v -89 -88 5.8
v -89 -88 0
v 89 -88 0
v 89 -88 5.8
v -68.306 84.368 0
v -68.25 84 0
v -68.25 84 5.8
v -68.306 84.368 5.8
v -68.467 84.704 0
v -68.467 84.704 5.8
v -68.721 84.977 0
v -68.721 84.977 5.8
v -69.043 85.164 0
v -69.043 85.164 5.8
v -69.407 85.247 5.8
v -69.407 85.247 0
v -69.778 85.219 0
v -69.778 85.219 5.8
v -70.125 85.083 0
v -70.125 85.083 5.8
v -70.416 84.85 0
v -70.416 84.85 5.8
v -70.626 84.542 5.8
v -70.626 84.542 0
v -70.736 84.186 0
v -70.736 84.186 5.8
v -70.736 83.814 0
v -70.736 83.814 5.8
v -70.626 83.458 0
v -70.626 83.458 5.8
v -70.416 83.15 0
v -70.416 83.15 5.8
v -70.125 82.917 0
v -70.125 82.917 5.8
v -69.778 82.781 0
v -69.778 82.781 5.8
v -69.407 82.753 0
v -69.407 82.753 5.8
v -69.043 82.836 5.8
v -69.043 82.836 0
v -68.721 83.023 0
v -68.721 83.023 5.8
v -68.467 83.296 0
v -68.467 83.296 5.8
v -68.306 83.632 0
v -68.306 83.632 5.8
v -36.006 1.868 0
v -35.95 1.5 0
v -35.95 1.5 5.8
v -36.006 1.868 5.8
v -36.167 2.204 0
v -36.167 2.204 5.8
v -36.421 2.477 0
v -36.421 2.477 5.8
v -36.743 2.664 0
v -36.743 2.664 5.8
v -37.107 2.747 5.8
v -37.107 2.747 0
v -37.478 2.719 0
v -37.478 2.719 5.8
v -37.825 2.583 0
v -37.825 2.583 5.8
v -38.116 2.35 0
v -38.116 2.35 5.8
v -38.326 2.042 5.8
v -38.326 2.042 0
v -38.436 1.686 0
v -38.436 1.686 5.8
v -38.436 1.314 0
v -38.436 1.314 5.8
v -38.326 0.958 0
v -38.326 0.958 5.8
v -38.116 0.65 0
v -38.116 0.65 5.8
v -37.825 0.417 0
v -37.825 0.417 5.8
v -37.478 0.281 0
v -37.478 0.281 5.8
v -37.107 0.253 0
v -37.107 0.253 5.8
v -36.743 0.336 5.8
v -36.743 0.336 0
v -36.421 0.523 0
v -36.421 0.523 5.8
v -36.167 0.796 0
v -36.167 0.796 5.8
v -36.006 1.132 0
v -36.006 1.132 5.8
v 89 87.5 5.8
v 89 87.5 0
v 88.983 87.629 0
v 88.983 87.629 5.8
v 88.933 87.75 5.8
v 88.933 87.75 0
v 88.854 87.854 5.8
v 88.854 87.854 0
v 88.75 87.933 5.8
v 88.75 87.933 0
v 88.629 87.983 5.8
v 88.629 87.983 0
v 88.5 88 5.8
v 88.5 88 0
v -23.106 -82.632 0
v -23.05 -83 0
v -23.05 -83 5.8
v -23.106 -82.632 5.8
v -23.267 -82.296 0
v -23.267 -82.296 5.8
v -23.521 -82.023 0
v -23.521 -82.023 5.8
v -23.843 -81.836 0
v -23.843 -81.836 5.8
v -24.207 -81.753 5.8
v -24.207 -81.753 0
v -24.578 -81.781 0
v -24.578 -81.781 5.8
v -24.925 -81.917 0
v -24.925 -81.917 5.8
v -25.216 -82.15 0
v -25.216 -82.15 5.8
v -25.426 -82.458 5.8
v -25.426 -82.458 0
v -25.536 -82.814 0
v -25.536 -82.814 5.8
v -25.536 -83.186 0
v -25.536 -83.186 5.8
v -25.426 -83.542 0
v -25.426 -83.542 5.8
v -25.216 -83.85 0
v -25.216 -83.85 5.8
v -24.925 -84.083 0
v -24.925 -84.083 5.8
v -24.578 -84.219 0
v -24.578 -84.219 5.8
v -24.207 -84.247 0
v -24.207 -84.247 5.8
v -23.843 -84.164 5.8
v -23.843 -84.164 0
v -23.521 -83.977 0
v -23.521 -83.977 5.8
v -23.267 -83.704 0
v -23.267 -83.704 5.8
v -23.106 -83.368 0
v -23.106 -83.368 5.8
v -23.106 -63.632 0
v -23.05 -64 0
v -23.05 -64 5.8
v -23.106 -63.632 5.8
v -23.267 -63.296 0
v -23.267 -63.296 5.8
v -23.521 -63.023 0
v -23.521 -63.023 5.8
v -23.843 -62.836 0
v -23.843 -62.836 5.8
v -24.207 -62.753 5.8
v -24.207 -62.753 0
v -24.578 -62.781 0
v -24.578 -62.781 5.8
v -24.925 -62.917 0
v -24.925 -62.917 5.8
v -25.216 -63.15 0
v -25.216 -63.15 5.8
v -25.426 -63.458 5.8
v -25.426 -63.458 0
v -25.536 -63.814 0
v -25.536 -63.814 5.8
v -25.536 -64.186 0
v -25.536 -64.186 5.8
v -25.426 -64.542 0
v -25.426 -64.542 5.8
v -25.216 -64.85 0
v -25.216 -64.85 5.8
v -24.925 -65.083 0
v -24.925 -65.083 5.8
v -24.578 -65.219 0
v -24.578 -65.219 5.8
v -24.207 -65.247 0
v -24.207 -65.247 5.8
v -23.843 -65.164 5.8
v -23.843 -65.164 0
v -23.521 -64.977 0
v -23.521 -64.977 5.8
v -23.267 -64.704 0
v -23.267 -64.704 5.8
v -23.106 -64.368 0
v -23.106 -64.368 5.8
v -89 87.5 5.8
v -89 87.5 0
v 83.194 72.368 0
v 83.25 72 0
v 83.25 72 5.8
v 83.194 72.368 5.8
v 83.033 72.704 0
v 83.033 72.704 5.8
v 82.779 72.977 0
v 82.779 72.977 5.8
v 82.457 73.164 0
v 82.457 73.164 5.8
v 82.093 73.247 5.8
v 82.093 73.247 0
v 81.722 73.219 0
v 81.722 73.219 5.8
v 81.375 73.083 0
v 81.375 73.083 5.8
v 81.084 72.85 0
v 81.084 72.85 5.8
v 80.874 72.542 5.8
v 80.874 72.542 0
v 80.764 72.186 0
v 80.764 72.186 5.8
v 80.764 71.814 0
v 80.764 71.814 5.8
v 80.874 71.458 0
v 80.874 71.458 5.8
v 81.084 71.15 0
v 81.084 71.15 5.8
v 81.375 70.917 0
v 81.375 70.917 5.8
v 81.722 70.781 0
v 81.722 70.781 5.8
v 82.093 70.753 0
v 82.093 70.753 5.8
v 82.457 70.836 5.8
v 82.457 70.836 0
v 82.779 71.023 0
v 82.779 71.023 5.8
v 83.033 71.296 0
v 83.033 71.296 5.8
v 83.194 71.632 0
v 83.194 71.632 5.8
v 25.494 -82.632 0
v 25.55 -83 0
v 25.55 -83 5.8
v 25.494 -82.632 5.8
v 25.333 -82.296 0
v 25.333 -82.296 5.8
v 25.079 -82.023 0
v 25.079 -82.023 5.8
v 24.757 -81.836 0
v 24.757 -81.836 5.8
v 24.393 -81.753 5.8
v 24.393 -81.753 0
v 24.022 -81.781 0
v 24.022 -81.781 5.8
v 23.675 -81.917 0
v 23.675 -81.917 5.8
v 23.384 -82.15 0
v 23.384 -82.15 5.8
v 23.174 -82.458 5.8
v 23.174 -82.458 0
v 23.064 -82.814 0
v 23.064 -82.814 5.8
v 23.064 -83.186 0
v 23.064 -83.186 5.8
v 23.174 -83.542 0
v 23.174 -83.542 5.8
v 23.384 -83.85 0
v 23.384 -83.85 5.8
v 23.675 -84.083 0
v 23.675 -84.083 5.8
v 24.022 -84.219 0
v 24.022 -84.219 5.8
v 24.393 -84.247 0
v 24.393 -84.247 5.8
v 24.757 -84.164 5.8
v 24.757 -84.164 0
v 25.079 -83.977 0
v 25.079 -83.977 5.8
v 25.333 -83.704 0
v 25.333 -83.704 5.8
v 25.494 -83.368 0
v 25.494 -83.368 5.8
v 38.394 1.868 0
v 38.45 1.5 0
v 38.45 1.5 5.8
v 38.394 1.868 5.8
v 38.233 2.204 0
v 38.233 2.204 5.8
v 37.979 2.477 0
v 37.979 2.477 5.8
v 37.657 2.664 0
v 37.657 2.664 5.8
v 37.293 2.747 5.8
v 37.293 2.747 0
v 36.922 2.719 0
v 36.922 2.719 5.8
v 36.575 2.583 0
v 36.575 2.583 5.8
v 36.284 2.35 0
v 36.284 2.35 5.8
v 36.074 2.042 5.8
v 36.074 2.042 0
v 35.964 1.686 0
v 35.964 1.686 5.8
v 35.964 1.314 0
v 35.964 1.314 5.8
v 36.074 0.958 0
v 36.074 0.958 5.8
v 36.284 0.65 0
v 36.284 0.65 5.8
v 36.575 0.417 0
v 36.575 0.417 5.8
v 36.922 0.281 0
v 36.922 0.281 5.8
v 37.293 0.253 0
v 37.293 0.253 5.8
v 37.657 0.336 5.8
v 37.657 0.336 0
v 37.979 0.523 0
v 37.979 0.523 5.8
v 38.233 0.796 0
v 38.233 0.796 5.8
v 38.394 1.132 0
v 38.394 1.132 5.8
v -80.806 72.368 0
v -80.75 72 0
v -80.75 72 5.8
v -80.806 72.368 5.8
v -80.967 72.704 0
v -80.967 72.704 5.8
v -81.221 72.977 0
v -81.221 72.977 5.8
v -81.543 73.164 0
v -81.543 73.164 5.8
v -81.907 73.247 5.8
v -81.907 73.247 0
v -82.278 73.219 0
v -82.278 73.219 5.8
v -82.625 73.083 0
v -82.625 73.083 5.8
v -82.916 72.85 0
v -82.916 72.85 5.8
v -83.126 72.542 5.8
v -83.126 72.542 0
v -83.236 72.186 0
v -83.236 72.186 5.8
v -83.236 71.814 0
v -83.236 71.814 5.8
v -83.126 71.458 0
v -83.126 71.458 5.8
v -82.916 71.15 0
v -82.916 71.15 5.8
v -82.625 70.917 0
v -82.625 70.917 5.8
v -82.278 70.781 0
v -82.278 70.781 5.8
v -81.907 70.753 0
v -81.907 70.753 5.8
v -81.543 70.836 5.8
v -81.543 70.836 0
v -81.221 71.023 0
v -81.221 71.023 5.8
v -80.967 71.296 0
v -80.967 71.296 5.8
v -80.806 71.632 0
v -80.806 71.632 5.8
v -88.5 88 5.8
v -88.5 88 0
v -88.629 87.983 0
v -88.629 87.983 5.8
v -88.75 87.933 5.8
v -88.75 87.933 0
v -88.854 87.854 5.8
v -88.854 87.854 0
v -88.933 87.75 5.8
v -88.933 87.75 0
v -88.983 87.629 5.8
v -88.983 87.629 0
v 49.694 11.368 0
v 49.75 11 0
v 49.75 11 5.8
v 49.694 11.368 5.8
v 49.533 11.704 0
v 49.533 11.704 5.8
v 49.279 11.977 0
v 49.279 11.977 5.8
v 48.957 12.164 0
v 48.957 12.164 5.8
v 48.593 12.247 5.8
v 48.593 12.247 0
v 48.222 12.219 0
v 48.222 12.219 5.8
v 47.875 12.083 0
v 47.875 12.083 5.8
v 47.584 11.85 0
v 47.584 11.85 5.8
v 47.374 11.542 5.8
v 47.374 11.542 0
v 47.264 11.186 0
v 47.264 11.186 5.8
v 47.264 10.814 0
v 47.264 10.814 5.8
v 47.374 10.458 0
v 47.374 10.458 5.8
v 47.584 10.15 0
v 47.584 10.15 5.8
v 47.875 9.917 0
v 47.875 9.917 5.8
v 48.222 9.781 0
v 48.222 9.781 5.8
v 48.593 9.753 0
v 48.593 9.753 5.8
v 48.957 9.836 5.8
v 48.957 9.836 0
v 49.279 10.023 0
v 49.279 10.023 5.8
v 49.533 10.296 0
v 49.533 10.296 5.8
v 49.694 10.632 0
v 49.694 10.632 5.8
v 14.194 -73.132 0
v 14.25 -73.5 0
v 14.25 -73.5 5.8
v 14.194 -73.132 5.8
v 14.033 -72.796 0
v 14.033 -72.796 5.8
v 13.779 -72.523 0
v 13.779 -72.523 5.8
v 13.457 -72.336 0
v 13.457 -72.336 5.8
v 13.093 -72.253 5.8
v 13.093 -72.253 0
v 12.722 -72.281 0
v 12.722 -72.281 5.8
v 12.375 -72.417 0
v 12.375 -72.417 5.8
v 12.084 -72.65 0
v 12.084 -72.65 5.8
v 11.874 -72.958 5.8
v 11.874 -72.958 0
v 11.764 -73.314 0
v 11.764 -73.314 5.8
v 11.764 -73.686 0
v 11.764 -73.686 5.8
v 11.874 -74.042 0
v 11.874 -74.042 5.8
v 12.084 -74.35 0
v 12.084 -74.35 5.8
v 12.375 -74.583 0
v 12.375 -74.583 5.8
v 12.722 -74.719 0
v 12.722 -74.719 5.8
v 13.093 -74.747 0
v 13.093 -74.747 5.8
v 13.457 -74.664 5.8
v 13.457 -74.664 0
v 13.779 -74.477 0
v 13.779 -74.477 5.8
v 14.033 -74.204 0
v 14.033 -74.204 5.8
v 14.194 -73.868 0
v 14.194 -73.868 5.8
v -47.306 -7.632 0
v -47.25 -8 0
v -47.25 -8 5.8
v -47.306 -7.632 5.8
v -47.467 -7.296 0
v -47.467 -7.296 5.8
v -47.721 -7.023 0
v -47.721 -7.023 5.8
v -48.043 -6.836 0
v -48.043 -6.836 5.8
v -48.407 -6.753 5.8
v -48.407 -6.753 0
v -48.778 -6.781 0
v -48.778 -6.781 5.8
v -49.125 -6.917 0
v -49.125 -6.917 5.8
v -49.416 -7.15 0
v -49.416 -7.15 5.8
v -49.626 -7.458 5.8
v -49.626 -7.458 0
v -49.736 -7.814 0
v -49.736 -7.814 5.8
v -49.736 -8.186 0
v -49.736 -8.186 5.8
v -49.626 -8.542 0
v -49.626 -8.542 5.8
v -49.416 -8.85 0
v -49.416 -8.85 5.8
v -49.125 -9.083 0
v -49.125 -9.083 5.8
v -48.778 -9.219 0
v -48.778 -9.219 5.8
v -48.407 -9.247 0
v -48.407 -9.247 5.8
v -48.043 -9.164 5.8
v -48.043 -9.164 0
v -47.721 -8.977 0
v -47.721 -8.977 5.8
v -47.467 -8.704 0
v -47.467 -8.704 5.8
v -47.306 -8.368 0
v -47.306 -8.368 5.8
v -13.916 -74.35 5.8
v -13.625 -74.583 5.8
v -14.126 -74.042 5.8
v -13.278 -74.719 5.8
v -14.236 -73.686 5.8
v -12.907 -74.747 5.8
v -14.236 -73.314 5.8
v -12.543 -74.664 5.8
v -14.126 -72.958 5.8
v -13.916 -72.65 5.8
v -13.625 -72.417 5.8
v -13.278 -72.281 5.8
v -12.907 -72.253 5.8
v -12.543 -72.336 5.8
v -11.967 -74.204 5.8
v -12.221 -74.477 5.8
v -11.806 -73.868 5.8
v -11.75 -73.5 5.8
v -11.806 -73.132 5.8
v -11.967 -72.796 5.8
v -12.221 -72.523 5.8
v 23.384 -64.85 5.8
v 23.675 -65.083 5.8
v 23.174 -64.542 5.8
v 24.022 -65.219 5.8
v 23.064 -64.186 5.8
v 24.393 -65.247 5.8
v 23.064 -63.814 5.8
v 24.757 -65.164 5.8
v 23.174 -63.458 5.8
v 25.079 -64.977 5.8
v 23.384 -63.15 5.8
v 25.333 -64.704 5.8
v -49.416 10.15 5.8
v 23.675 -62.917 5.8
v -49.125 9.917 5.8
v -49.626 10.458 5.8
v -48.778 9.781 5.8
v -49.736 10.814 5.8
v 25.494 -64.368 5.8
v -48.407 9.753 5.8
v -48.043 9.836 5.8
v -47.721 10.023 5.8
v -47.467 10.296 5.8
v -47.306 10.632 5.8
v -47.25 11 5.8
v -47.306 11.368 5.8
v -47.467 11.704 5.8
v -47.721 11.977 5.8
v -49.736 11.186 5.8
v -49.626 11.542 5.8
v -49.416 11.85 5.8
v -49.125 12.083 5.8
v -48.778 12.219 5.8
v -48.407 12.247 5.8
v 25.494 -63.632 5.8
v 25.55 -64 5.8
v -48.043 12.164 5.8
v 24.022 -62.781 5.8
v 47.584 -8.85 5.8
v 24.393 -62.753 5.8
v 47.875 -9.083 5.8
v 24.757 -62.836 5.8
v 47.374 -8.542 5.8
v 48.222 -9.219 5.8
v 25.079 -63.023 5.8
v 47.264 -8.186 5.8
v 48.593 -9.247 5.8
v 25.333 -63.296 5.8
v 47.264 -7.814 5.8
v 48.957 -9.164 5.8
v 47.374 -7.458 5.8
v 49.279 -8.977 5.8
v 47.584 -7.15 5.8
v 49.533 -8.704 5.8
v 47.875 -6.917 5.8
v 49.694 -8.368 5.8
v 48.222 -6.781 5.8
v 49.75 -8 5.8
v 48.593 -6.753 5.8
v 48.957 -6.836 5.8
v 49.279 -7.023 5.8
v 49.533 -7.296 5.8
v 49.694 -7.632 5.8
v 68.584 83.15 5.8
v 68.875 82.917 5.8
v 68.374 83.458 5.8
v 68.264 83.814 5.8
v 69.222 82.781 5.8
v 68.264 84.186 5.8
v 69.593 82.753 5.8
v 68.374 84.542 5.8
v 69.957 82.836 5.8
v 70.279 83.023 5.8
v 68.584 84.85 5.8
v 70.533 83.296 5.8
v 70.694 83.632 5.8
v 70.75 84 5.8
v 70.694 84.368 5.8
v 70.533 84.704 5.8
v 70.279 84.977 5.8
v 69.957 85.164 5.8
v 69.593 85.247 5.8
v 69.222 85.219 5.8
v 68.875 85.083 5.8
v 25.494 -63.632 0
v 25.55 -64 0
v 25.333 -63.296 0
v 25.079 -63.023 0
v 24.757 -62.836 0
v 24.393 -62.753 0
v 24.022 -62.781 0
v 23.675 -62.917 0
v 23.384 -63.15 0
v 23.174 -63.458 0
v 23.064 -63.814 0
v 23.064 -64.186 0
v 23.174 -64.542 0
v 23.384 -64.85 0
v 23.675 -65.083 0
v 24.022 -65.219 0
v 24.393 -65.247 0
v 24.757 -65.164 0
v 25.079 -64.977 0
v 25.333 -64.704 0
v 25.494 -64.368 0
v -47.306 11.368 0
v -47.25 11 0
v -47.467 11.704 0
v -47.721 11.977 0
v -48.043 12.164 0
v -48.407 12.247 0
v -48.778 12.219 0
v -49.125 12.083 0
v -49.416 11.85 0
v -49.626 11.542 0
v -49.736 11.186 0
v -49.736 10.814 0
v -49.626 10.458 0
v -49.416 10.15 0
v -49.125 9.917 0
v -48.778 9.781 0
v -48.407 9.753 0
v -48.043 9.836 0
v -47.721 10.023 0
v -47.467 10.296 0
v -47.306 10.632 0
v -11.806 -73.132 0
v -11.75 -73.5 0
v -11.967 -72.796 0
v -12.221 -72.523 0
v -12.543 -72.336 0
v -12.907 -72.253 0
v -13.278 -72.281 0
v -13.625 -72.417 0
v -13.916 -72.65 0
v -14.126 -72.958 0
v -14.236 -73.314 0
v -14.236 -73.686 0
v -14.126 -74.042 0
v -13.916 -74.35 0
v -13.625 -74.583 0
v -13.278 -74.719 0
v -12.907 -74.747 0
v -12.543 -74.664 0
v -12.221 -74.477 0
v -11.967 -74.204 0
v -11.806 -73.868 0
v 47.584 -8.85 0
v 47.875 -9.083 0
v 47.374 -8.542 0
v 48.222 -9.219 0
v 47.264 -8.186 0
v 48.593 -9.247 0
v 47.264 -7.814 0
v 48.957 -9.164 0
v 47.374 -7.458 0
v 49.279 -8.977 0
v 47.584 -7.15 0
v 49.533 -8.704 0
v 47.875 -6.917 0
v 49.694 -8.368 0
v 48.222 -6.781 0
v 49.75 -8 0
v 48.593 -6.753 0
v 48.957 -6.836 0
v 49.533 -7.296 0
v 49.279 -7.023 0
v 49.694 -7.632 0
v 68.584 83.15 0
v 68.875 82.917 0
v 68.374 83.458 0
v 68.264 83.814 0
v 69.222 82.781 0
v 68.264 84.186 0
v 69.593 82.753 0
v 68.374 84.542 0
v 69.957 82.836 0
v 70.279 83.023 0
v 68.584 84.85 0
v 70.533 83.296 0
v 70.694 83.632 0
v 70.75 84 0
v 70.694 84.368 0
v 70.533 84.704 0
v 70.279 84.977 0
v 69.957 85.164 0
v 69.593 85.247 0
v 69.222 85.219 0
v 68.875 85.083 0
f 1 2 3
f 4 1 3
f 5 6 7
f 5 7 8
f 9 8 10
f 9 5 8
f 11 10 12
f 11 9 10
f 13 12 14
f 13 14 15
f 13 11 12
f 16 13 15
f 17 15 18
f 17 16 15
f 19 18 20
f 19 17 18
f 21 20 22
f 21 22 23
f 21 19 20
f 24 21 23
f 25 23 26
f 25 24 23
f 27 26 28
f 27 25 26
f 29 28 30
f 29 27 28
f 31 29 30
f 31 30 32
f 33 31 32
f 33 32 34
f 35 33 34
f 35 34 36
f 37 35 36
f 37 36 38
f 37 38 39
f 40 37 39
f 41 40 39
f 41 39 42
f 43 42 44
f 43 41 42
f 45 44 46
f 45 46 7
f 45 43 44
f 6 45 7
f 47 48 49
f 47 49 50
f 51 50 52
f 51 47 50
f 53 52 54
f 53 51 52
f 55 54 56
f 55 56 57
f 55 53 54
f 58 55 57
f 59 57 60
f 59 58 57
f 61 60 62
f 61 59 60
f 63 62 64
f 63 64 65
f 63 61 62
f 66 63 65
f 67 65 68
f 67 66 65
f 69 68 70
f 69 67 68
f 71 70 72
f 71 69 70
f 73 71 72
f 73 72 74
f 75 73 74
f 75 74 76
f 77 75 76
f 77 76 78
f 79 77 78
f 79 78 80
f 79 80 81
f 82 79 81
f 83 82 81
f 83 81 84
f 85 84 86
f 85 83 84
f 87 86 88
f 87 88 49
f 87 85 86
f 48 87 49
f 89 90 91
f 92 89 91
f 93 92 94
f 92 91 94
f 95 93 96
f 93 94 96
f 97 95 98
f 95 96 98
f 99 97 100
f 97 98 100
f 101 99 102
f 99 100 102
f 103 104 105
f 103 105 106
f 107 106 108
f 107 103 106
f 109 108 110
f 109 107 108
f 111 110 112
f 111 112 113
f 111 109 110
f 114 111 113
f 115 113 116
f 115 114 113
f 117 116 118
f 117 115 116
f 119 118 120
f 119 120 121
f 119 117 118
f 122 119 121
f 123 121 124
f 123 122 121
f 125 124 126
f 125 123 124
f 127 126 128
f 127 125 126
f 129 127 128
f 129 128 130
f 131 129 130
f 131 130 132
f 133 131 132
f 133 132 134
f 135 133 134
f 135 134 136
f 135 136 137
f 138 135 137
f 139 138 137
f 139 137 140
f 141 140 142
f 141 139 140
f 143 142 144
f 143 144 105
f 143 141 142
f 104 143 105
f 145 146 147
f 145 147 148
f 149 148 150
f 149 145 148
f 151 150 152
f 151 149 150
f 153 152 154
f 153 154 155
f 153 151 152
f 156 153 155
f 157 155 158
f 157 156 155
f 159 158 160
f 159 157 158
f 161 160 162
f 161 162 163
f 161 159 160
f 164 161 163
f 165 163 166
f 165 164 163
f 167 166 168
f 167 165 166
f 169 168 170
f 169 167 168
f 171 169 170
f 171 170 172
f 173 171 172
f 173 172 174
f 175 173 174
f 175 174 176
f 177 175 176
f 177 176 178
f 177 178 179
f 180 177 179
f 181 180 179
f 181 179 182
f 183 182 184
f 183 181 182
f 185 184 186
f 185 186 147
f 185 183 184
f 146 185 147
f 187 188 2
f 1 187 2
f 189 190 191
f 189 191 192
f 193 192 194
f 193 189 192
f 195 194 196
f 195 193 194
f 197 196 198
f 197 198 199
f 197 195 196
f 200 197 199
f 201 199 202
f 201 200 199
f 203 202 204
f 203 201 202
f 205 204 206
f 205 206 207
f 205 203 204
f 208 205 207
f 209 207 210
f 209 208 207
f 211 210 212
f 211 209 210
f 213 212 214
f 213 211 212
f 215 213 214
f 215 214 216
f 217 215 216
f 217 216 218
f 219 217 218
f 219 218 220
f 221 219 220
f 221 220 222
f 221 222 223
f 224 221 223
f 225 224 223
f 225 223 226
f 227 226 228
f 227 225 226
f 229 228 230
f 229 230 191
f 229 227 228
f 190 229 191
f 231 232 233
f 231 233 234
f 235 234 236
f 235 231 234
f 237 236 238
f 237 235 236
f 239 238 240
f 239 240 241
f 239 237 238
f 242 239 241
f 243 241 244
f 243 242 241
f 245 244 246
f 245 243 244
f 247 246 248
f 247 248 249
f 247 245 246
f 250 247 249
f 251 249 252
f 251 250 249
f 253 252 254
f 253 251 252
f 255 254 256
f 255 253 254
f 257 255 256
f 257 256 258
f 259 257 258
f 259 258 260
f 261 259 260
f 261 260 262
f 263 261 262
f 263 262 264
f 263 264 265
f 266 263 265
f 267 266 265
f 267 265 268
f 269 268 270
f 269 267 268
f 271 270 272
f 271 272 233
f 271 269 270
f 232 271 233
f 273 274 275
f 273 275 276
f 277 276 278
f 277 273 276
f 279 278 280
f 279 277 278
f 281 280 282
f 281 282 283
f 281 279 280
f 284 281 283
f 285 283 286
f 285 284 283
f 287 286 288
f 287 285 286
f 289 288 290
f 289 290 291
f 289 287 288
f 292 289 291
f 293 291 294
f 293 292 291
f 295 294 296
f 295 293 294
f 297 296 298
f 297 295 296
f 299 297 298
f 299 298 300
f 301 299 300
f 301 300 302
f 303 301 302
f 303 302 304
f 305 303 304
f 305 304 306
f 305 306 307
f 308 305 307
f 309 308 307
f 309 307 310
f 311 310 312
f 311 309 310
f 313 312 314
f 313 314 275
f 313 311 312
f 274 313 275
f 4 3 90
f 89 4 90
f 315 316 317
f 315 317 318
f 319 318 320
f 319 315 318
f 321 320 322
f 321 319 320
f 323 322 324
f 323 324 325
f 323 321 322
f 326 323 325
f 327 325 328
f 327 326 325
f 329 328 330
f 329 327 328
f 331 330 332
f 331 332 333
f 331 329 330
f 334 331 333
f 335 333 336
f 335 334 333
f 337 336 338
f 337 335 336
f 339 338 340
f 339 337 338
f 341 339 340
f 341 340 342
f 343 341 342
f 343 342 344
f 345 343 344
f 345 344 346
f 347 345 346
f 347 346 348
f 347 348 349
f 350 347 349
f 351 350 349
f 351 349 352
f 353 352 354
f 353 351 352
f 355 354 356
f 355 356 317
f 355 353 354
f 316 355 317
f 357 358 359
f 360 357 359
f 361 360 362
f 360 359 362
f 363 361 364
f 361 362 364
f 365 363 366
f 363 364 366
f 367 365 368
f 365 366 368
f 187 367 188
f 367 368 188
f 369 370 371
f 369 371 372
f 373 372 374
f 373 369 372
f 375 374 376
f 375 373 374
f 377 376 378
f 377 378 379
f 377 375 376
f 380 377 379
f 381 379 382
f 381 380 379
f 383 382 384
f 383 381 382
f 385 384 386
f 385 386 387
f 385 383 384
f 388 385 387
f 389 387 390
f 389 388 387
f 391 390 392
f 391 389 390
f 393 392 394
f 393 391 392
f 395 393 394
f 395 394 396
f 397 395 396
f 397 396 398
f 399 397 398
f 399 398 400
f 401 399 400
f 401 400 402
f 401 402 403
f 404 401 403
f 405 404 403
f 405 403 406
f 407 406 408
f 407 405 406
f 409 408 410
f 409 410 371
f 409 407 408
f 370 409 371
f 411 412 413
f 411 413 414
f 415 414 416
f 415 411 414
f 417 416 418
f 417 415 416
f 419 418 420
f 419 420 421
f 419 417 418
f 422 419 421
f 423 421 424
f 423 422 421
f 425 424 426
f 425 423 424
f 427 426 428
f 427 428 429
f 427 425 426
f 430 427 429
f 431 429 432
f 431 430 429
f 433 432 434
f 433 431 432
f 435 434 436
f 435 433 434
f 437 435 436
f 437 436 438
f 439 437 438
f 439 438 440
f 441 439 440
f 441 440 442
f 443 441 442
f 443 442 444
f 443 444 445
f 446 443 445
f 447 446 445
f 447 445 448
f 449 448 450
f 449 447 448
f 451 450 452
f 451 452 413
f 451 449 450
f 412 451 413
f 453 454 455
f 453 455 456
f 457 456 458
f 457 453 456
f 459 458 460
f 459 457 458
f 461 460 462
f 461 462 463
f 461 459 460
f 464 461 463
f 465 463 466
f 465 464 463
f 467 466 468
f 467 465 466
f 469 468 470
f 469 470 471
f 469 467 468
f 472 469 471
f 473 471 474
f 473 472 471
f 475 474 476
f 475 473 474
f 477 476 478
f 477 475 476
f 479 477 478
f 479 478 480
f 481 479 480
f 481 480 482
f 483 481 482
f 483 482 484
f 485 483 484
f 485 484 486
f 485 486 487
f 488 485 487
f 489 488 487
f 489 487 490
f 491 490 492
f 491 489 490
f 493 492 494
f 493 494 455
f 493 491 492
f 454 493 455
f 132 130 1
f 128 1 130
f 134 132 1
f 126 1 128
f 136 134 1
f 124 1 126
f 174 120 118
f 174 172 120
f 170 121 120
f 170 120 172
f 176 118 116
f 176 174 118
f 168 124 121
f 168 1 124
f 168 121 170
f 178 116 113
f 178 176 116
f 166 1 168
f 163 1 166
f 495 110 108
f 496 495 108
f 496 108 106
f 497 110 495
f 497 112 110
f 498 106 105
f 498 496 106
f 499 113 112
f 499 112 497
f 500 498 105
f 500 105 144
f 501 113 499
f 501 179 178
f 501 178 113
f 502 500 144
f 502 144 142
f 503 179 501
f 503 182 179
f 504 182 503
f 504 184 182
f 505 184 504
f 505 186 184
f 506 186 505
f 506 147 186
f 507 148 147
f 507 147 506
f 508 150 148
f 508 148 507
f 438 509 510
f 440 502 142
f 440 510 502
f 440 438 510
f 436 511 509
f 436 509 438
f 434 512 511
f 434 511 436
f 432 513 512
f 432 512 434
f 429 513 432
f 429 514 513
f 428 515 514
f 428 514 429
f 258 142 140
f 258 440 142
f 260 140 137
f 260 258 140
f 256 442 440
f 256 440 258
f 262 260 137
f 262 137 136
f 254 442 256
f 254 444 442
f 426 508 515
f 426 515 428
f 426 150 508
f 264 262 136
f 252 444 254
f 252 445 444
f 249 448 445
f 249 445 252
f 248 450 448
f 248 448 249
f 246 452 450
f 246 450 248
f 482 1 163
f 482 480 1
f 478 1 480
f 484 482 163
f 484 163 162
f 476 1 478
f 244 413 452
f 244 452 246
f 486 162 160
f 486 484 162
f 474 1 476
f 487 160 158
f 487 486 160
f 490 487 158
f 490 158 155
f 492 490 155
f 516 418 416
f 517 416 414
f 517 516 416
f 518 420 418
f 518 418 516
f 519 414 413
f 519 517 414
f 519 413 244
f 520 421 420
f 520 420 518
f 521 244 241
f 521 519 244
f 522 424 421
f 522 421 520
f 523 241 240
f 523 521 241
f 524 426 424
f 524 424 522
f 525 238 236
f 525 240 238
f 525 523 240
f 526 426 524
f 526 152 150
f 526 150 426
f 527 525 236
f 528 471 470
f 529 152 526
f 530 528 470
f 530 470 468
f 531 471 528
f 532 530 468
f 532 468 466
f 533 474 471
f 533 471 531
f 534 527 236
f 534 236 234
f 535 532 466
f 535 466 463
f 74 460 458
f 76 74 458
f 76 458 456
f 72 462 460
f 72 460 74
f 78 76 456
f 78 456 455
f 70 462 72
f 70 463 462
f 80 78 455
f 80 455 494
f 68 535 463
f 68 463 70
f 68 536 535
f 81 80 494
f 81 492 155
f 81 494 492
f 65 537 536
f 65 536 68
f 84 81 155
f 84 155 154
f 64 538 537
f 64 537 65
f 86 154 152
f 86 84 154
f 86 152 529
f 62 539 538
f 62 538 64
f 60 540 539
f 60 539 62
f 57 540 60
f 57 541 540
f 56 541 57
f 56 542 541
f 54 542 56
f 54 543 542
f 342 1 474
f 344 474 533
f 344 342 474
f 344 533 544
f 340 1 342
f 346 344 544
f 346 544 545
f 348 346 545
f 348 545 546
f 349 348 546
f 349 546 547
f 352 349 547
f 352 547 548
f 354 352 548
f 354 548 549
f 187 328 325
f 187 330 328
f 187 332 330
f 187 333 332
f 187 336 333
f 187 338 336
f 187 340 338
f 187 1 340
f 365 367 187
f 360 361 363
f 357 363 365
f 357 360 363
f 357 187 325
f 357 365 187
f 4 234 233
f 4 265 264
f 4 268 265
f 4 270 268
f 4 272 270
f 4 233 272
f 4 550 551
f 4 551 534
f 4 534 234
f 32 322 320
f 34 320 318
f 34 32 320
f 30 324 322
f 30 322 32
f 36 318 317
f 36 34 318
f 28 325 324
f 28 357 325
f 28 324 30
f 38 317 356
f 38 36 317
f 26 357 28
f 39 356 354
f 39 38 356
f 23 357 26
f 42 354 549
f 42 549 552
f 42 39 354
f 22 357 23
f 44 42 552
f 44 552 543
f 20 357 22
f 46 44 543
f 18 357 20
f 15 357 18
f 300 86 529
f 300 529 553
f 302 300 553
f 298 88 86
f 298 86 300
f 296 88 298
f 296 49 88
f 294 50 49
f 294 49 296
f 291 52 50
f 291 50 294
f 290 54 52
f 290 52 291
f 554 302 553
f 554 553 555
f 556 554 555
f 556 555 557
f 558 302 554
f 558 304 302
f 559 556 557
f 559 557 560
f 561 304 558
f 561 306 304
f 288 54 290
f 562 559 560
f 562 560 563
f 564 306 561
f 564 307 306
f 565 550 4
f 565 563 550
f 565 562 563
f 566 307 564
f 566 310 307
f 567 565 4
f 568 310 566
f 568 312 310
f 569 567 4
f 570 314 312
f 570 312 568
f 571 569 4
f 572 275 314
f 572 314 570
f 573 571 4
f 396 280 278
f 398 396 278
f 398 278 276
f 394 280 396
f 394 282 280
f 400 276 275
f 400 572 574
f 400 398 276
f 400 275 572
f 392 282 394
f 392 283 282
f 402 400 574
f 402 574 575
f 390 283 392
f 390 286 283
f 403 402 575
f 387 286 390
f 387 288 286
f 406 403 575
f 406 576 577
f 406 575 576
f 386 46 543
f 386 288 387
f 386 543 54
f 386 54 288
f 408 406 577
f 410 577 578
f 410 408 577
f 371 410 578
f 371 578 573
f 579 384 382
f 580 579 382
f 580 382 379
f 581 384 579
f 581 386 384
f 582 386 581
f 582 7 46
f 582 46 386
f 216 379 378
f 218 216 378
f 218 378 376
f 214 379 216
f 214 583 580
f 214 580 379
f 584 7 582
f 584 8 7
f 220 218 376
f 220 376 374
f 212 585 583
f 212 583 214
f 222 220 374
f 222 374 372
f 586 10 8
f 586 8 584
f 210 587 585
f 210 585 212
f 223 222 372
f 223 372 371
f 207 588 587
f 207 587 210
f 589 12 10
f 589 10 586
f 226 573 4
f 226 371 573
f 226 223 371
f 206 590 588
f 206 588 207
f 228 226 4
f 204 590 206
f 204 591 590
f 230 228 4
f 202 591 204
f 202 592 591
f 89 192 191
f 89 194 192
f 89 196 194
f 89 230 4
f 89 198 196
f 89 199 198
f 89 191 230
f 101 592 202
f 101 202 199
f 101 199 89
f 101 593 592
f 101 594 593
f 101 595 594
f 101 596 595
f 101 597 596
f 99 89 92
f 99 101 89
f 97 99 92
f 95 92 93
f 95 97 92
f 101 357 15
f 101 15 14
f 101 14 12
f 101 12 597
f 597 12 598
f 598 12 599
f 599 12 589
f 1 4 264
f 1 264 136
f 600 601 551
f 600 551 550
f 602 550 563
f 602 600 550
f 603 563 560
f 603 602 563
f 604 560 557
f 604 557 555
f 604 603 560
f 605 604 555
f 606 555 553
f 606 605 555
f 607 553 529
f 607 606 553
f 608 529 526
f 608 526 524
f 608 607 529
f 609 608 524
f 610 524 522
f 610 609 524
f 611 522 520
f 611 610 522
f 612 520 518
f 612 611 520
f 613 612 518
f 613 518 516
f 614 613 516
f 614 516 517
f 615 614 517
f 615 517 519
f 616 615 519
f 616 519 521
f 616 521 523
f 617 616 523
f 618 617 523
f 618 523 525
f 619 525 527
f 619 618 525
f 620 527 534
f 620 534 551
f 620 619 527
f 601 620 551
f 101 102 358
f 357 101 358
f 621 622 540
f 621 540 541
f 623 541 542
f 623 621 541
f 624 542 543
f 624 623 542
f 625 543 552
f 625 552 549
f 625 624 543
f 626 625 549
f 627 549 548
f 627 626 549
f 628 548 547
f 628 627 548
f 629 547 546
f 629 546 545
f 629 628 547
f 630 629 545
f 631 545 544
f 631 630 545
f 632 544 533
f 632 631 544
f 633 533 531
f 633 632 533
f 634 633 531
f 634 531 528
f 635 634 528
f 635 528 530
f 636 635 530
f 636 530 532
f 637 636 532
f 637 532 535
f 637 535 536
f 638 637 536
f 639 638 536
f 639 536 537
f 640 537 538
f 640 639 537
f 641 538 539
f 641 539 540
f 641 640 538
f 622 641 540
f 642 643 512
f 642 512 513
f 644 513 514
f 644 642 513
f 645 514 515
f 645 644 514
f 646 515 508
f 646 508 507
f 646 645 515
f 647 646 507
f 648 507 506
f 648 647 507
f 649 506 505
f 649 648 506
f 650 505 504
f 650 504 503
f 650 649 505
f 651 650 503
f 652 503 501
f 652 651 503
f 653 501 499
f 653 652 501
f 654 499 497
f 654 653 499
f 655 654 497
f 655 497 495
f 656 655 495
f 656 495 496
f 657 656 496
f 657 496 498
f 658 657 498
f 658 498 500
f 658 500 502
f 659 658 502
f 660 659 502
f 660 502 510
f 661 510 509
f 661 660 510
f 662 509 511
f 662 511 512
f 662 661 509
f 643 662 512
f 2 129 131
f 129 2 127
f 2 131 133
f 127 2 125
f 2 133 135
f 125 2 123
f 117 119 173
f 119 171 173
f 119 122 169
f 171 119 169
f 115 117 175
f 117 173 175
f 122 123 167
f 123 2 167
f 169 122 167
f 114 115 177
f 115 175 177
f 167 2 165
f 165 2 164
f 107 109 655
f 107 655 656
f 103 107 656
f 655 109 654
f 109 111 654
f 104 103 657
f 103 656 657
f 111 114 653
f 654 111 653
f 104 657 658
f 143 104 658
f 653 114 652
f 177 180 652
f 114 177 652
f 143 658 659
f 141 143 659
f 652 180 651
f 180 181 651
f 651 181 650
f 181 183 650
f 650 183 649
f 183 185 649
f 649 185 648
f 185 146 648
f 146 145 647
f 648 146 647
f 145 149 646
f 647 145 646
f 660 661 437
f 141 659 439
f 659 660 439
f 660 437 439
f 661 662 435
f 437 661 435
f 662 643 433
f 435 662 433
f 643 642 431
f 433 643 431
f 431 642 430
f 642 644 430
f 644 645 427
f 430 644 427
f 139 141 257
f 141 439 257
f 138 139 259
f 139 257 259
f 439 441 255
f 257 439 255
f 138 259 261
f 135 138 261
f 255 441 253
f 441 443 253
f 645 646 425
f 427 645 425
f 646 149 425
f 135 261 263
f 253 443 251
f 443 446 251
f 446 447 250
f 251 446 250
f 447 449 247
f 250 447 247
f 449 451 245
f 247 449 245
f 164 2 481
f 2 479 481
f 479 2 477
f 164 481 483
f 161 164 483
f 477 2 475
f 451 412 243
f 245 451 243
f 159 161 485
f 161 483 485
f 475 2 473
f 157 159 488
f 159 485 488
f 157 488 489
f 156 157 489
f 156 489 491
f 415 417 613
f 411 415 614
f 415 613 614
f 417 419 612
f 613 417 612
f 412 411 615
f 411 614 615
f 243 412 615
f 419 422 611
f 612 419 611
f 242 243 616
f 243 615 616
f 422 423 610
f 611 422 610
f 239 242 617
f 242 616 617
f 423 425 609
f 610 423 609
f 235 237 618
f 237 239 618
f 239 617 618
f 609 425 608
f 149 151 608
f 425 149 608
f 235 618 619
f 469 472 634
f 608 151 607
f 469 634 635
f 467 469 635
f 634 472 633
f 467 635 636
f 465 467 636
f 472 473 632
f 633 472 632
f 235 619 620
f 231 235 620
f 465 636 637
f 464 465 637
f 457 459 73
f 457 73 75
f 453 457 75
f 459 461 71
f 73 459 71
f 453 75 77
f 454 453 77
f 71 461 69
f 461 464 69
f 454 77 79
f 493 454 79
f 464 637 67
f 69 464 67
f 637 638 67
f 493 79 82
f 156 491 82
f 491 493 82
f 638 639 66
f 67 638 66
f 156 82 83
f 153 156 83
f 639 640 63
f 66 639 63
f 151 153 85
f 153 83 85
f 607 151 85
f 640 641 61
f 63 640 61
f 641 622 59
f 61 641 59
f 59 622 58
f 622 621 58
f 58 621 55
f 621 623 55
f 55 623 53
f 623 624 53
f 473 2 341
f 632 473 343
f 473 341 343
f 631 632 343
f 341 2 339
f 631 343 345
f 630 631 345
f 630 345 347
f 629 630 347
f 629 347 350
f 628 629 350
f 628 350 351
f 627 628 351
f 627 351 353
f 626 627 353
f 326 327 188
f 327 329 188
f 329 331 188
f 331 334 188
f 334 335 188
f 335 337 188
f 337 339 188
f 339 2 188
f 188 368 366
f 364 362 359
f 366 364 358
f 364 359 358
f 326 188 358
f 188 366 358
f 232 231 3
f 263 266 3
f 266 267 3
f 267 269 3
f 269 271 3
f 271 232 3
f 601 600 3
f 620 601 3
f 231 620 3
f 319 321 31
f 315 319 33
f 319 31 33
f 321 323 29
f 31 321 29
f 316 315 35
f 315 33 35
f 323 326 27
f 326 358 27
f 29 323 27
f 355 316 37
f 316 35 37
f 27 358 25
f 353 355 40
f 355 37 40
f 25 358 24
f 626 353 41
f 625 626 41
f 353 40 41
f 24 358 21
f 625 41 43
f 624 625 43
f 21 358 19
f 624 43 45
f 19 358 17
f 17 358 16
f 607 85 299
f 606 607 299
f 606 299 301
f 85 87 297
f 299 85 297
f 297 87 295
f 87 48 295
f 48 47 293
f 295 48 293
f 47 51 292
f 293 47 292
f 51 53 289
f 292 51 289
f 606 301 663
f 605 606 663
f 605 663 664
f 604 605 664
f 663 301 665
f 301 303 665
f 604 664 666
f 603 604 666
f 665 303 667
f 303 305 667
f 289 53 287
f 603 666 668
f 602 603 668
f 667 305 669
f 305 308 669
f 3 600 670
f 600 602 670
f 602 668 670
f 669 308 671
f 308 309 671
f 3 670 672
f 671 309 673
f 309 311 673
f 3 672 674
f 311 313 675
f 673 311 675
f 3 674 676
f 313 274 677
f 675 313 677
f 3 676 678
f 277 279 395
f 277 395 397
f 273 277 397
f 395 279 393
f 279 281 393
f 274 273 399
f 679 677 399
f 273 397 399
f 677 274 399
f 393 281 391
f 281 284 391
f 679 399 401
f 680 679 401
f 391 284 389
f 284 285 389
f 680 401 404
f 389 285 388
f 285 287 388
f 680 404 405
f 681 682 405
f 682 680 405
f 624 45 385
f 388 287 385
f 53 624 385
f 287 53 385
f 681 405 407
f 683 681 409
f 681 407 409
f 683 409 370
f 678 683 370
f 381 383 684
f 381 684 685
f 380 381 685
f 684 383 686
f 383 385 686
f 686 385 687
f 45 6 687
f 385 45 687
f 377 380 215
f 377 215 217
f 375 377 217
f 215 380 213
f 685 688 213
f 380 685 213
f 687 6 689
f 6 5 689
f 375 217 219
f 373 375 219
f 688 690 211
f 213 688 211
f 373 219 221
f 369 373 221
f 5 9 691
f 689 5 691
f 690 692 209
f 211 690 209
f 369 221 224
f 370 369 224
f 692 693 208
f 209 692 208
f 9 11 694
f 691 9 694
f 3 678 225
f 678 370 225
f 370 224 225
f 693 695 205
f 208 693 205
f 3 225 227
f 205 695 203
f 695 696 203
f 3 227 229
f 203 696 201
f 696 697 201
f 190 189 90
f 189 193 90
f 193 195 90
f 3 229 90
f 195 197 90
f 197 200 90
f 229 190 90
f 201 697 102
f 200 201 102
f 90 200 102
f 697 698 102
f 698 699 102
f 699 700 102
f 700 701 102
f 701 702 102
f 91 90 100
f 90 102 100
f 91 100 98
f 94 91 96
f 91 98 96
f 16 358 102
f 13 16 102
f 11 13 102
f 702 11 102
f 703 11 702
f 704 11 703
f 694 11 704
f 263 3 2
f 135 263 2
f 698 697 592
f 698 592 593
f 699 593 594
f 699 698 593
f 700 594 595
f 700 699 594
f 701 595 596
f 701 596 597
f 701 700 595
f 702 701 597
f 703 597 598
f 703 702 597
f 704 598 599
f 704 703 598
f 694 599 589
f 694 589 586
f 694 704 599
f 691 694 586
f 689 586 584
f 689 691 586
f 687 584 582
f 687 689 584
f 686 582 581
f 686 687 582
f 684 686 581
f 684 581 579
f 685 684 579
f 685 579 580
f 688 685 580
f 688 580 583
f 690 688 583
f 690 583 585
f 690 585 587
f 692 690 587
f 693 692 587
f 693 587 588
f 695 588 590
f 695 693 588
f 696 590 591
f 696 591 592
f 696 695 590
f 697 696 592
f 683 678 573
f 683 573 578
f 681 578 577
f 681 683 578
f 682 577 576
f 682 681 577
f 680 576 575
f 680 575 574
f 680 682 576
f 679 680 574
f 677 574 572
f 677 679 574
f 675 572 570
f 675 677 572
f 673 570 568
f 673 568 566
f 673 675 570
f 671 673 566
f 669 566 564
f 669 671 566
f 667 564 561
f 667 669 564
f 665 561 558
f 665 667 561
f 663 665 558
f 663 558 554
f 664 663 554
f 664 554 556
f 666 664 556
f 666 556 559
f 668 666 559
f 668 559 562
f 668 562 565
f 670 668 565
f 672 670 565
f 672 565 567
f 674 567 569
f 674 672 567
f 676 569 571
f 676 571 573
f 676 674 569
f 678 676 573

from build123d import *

# Parameters (mm, degrees)
F0_R     = 1.25
F1_DEPTH = 5.8


with BuildPart() as f1:
    # F0 (on Top) → F1 (new body)
    with BuildSketch(Plane.XY):
        with BuildLine():
            ThreePointArc((89, 87.5), (88.853553, 87.853553), (88.5, 88))
            Line((88.5, 88), (-88.5, 88))
            ThreePointArc((-88.5, 88), (-88.853553, 87.853553), (-89, 87.5))
            Line((-89, 87.5), (-89, -88))
            Line((-89, -88), (2, -88))
            Line((2, -88), (58.5, -88))
            Line((58.5, -88), (89, -88))
            Line((89, -88), (89, 87.5))
        make_face()
        with Locations((-24.3, -83)):
            Circle(F0_R, mode=Mode.SUBTRACT)
        with Locations((-13, -73.5)):
            Circle(F0_R, mode=Mode.SUBTRACT)
        with Locations((-24.3, -64)):
            Circle(F0_R, mode=Mode.SUBTRACT)
        with Locations((-48.5, -8)):
            Circle(F0_R, mode=Mode.SUBTRACT)
        with Locations((13, -73.5)):
            Circle(F0_R, mode=Mode.SUBTRACT)
        with Locations((24.3, -83)):
            Circle(F0_R, mode=Mode.SUBTRACT)
        with Locations((24.3, -64)):
            Circle(F0_R, mode=Mode.SUBTRACT)
        with Locations((48.5, -8)):
            Circle(F0_R, mode=Mode.SUBTRACT)
        with Locations((-48.5, 11)):
            Circle(F0_R, mode=Mode.SUBTRACT)
        with Locations((-37.2, 1.5)):
            Circle(F0_R, mode=Mode.SUBTRACT)
        with Locations((-82, 72)):
            Circle(F0_R, mode=Mode.SUBTRACT)
        with Locations((-69.5, 84)):
            Circle(F0_R, mode=Mode.SUBTRACT)
        with Locations((37.2, 1.5)):
            Circle(F0_R, mode=Mode.SUBTRACT)
        with Locations((48.5, 11)):
            Circle(F0_R, mode=Mode.SUBTRACT)
        with Locations((82, 72)):
            Circle(F0_R, mode=Mode.SUBTRACT)
        with Locations((69.5, 84)):
            Circle(F0_R, mode=Mode.SUBTRACT)
    extrude(amount=F1_DEPTH)


solid = f1.part
